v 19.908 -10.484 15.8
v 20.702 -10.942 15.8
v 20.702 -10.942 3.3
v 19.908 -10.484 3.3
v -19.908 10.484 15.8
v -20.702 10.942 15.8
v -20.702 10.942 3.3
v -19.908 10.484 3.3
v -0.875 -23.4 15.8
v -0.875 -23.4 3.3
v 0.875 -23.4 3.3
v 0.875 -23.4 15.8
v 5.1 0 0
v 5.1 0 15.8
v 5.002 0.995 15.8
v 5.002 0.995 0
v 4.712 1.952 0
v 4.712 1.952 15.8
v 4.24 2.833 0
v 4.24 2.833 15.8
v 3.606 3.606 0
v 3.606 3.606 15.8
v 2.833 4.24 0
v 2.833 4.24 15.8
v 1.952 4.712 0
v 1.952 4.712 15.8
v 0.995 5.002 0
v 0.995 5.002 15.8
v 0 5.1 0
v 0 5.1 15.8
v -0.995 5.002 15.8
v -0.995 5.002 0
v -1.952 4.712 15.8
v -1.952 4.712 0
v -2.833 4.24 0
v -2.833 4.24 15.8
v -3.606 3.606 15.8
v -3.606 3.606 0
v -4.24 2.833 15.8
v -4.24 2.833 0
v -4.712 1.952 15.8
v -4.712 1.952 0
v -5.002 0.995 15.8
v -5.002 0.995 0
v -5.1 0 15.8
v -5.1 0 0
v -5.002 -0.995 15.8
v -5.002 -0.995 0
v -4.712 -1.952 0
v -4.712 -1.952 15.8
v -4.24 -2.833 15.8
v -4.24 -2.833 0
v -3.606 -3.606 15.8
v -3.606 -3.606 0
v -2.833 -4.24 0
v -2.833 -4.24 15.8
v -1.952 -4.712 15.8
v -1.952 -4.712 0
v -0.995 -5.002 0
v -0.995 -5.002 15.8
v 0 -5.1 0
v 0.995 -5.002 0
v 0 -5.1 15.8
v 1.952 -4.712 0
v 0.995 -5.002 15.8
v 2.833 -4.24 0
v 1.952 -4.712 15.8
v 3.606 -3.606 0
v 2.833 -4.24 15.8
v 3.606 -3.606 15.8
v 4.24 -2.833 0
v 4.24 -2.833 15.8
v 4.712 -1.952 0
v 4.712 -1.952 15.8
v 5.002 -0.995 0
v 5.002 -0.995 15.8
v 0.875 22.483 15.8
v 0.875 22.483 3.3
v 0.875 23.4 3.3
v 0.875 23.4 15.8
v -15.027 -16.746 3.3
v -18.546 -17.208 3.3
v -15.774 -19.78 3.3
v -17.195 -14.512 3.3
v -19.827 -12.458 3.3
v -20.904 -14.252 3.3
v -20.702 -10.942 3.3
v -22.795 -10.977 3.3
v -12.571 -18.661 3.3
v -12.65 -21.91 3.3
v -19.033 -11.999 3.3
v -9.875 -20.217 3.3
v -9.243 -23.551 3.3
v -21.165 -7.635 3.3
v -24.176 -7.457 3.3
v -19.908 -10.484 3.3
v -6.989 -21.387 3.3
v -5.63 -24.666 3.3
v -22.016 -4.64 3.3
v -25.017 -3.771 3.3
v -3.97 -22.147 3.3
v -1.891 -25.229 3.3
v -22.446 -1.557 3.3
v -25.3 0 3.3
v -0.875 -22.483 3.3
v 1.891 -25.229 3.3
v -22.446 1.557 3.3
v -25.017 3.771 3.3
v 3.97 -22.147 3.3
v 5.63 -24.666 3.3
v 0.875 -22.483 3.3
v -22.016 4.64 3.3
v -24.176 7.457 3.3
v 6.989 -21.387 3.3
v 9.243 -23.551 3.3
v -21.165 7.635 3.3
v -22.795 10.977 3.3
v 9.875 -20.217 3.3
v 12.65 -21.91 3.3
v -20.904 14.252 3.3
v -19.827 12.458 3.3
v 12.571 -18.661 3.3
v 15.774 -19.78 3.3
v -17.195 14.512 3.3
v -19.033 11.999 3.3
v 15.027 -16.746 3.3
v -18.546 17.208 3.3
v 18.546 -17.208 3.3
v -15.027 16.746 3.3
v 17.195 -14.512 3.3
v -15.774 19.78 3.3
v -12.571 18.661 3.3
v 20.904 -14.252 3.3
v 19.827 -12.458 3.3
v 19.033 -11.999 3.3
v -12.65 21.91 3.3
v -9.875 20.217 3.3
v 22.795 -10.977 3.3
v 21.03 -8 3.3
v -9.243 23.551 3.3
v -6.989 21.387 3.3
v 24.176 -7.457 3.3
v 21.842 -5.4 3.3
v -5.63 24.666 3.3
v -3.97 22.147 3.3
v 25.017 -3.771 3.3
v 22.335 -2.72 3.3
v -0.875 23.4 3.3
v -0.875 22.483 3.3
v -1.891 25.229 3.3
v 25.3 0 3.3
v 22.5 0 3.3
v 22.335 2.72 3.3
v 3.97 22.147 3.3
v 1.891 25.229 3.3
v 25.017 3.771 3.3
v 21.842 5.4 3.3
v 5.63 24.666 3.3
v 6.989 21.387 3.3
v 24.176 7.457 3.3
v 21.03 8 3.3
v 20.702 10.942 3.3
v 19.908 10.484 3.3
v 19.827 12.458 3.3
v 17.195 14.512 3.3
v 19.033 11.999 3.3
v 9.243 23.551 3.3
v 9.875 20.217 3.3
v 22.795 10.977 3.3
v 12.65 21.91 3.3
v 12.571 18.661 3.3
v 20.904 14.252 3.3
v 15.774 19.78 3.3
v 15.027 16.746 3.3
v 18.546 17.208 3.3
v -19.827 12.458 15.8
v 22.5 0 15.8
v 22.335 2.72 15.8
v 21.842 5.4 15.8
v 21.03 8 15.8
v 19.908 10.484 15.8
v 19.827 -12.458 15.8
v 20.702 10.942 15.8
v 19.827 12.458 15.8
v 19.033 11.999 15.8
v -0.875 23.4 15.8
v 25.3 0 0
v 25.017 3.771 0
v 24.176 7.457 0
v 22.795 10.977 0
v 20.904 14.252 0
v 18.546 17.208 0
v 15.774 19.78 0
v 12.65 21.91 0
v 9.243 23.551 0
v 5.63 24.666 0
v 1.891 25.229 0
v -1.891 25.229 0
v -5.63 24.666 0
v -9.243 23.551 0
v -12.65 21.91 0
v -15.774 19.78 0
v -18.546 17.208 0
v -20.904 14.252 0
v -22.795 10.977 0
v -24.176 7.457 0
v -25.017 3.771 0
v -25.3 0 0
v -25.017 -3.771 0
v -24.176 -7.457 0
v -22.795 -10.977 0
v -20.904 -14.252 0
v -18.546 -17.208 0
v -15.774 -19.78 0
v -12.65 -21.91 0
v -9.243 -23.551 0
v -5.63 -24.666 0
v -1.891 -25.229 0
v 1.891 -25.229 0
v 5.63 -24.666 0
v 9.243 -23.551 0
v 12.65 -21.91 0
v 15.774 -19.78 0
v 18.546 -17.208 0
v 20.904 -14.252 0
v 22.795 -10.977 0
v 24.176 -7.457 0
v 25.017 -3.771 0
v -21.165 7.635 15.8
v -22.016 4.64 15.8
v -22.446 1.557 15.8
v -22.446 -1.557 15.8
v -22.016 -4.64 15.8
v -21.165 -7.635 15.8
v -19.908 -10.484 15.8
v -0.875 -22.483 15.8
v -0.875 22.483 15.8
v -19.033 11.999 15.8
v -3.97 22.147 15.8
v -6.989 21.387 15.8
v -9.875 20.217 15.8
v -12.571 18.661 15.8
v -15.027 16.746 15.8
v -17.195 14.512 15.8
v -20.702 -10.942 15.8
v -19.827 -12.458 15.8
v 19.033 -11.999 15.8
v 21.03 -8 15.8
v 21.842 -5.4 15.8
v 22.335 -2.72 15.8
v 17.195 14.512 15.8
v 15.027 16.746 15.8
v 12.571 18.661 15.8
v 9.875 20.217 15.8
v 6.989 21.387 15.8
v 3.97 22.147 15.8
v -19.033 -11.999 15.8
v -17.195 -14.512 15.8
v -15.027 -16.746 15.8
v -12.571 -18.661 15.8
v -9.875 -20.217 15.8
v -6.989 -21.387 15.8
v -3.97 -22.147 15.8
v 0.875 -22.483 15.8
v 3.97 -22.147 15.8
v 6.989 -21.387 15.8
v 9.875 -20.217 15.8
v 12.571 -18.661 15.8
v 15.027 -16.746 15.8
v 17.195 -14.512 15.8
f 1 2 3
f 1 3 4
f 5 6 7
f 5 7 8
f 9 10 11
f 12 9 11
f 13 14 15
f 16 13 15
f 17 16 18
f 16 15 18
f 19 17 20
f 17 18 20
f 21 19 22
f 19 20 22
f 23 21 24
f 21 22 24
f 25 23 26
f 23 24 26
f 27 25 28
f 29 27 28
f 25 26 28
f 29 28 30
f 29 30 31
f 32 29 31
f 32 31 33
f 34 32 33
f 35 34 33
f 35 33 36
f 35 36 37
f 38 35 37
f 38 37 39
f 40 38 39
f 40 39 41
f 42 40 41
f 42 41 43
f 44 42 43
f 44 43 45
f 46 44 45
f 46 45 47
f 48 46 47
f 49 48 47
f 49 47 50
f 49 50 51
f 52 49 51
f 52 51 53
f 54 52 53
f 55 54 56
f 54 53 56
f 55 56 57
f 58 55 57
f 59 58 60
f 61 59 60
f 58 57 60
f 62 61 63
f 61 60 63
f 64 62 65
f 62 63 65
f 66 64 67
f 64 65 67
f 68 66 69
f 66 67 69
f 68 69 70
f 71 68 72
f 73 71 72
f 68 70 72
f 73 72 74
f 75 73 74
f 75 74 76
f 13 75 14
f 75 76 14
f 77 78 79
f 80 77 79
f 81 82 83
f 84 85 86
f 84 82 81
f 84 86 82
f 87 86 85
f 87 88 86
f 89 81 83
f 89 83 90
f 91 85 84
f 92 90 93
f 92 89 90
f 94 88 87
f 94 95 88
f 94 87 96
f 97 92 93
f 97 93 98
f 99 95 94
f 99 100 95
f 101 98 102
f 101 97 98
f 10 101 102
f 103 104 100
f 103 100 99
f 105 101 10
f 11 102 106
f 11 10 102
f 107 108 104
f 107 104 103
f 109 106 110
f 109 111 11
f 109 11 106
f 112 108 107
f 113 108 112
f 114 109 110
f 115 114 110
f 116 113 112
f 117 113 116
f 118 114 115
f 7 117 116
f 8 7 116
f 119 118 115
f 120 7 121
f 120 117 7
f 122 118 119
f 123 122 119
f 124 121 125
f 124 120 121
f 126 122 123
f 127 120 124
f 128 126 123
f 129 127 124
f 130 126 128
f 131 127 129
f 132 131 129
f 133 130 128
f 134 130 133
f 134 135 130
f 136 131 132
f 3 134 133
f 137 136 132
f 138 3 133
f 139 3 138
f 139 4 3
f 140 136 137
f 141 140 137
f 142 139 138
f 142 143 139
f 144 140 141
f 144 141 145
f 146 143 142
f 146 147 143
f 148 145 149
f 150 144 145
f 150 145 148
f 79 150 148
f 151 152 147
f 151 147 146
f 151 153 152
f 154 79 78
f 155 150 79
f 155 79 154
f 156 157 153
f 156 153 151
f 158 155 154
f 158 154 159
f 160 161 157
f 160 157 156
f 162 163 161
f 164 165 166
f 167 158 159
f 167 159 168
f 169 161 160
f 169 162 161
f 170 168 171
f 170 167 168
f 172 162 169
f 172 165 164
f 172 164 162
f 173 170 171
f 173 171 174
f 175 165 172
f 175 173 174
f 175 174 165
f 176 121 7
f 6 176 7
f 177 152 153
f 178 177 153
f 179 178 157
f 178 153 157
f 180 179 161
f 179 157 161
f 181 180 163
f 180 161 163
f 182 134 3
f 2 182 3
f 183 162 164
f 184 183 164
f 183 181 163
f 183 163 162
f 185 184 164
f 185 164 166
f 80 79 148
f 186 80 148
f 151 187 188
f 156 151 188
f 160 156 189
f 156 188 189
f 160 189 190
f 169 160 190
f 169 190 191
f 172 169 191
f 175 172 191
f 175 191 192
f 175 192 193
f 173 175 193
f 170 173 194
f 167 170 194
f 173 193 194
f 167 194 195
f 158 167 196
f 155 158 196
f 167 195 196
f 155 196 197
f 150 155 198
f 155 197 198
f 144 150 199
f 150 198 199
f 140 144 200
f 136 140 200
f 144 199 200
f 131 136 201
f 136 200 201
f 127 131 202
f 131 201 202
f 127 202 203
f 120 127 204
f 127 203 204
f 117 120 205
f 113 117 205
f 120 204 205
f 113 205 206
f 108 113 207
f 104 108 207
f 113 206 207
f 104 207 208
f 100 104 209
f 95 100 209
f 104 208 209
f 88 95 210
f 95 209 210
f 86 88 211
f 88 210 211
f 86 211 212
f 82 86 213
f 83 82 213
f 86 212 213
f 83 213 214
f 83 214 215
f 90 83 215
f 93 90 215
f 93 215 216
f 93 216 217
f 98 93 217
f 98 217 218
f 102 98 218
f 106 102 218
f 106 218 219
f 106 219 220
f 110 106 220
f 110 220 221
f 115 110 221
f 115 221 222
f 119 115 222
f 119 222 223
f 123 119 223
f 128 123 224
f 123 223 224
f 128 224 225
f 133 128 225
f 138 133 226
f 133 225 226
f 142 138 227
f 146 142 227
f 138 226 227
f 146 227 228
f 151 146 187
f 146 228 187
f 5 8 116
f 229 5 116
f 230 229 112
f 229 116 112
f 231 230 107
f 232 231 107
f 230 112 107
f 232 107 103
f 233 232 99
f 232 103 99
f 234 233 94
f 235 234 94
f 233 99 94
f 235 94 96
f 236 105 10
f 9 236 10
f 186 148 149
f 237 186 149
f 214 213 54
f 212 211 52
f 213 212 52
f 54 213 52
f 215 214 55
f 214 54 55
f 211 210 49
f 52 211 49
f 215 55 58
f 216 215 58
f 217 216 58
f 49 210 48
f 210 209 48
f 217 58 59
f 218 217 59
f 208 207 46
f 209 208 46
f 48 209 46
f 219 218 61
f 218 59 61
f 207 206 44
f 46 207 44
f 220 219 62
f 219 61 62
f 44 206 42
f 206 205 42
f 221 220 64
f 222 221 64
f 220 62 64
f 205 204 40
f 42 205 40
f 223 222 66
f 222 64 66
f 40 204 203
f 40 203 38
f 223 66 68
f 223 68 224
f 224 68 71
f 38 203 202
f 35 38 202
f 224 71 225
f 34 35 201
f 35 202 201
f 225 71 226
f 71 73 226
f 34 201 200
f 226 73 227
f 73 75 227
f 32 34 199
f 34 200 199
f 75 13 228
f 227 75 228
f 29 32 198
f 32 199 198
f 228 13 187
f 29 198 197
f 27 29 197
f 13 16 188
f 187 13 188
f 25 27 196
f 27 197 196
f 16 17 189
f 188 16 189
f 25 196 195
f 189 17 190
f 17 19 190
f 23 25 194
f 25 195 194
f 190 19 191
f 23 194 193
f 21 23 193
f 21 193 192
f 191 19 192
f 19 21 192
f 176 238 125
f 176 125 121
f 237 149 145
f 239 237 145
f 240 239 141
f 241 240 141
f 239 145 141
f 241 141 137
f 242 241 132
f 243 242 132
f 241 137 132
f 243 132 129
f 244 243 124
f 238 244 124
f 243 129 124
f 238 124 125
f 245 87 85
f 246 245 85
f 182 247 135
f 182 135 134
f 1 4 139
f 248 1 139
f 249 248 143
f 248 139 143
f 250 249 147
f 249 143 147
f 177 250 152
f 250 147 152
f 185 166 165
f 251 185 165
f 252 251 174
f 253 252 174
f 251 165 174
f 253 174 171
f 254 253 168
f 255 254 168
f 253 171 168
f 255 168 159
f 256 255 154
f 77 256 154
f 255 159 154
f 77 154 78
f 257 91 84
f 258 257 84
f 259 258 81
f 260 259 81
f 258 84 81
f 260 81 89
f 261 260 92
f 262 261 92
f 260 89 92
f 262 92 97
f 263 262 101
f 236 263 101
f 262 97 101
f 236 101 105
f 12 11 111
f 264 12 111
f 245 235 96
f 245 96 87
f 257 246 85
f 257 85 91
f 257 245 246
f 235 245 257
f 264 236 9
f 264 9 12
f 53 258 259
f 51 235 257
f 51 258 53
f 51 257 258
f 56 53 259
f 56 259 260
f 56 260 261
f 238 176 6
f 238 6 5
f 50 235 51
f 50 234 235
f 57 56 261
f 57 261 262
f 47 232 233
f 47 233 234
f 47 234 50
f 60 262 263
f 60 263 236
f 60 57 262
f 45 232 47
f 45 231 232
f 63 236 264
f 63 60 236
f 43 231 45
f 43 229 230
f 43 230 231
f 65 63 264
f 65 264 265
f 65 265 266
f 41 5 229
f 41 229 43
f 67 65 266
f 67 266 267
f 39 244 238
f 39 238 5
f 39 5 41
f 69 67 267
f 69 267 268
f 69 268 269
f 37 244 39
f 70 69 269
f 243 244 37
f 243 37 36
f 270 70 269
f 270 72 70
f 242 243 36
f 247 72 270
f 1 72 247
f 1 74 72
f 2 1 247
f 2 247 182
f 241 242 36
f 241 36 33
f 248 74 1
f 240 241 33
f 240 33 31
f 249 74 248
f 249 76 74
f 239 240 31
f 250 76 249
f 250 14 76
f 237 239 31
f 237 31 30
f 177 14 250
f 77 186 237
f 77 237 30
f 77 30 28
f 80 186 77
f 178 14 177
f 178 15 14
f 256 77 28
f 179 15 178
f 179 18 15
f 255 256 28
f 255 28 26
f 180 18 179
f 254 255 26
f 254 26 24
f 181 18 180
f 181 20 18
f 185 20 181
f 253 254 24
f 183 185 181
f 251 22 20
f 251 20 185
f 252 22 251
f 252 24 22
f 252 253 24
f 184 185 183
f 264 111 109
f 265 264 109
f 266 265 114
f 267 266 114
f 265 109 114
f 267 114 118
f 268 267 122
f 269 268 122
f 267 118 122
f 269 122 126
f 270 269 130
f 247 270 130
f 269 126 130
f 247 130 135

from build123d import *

# Parameters (mm, degrees)
F0_R     = 25.3
F1_DEPTH = 3.3
F3_DEPTH = 12.5
F4_R     = 5.1
F5_DEPTH = 15.801


with BuildPart() as f1:
    # F0 (on Top) → F1 (new body)
    with BuildSketch(Plane.XY):
        Circle(F0_R)
    extrude(amount=F1_DEPTH)

    # F2 (on face) → F3 (join)
    with BuildSketch(Plane.XY.offset(3.3)):
        with BuildLine():
            ThreePointArc((19.908332, -10.483718), (21.842475, -5.399655), (22.5, 0))
            ThreePointArc((22.5, 0), (21.842475, 5.399655), (19.908332, 10.483718))
            ThreePointArc((19.908332, 10.483718), (19.485572, 11.25), (19.033332, 11.999262))
            ThreePointArc((19.033332, 11.999262), (11.25, 19.485572), (0.875, 22.48298))
            ThreePointArc((0.875, 22.48298), (0, 22.5), (-0.875, 22.48298))
            ThreePointArc((-0.875, 22.48298), (-11.25, 19.485572), (-19.033332, 11.999262))
            ThreePointArc((-19.033332, 11.999262), (-19.485572, 11.25), (-19.908332, 10.483718))
            ThreePointArc((-19.908332, 10.483718), (-22.5, 0), (-19.908332, -10.483718))
            ThreePointArc((-19.908332, -10.483718), (-19.485572, -11.25), (-19.033332, -11.999262))
            ThreePointArc((-19.033332, -11.999262), (-11.25, -19.485572), (-0.875, -22.48298))
            ThreePointArc((-0.875, -22.48298), (0, -22.5), (0.875, -22.48298))
            ThreePointArc((0.875, -22.48298), (11.25, -19.485572), (19.033332, -11.999262))
            ThreePointArc((19.033332, -11.999262), (19.485572, -11.25), (19.908332, -10.483718))
        make_face()
        with BuildLine():
            ThreePointArc((19.033332, 11.999262), (19.485572, 11.25), (19.908332, 10.483718))
            Line((19.908332, 10.483718), (20.702494, 10.942228))
            Line((20.702494, 10.942228), (19.827494, 12.457772))
            Line((19.827494, 12.457772), (19.033332, 11.999262))
        make_face()
        with BuildLine():
            Line((20.702494, -10.942228), (19.908332, -10.483718))
            ThreePointArc((19.908332, -10.483718), (19.485572, -11.25), (19.033332, -11.999262))
            Line((19.033332, -11.999262), (19.827494, -12.457772))
            Line((19.827494, -12.457772), (20.702494, -10.942228))
        make_face()
        with BuildLine():
            ThreePointArc((-0.875, 22.48298), (0, 22.5), (0.875, 22.48298))
            Line((0.875, 22.48298), (0.875, 23.4))
            Line((0.875, 23.4), (-0.875, 23.4))
            Line((-0.875, 23.4), (-0.875, 22.48298))
        make_face()
        with BuildLine():
            Line((0.875, -23.4), (0.875, -22.48298))
            ThreePointArc((0.875, -22.48298), (0, -22.5), (-0.875, -22.48298))
            Line((-0.875, -22.48298), (-0.875, -23.4))
            Line((-0.875, -23.4), (0.875, -23.4))
        make_face()
        with BuildLine():
            ThreePointArc((-19.908332, 10.483718), (-19.485572, 11.25), (-19.033332, 11.999262))
            Line((-19.033332, 11.999262), (-19.827494, 12.457772))
            Line((-19.827494, 12.457772), (-20.702494, 10.942228))
            Line((-20.702494, 10.942228), (-19.908332, 10.483718))
        make_face()
        with BuildLine():
            Line((-19.827494, -12.457772), (-19.033332, -11.999262))
            ThreePointArc((-19.033332, -11.999262), (-19.485572, -11.25), (-19.908332, -10.483718))
            Line((-19.908332, -10.483718), (-20.702494, -10.942228))
            Line((-20.702494, -10.942228), (-19.827494, -12.457772))
        make_face()
    extrude(amount=F3_DEPTH)

    # F4 (on face) → F5 (cut, through all)
    with BuildSketch(Plane.XY.offset(15.8)):
        Circle(F4_R)
    extrude(amount=-F5_DEPTH, mode=Mode.SUBTRACT)


solid = f1.part
